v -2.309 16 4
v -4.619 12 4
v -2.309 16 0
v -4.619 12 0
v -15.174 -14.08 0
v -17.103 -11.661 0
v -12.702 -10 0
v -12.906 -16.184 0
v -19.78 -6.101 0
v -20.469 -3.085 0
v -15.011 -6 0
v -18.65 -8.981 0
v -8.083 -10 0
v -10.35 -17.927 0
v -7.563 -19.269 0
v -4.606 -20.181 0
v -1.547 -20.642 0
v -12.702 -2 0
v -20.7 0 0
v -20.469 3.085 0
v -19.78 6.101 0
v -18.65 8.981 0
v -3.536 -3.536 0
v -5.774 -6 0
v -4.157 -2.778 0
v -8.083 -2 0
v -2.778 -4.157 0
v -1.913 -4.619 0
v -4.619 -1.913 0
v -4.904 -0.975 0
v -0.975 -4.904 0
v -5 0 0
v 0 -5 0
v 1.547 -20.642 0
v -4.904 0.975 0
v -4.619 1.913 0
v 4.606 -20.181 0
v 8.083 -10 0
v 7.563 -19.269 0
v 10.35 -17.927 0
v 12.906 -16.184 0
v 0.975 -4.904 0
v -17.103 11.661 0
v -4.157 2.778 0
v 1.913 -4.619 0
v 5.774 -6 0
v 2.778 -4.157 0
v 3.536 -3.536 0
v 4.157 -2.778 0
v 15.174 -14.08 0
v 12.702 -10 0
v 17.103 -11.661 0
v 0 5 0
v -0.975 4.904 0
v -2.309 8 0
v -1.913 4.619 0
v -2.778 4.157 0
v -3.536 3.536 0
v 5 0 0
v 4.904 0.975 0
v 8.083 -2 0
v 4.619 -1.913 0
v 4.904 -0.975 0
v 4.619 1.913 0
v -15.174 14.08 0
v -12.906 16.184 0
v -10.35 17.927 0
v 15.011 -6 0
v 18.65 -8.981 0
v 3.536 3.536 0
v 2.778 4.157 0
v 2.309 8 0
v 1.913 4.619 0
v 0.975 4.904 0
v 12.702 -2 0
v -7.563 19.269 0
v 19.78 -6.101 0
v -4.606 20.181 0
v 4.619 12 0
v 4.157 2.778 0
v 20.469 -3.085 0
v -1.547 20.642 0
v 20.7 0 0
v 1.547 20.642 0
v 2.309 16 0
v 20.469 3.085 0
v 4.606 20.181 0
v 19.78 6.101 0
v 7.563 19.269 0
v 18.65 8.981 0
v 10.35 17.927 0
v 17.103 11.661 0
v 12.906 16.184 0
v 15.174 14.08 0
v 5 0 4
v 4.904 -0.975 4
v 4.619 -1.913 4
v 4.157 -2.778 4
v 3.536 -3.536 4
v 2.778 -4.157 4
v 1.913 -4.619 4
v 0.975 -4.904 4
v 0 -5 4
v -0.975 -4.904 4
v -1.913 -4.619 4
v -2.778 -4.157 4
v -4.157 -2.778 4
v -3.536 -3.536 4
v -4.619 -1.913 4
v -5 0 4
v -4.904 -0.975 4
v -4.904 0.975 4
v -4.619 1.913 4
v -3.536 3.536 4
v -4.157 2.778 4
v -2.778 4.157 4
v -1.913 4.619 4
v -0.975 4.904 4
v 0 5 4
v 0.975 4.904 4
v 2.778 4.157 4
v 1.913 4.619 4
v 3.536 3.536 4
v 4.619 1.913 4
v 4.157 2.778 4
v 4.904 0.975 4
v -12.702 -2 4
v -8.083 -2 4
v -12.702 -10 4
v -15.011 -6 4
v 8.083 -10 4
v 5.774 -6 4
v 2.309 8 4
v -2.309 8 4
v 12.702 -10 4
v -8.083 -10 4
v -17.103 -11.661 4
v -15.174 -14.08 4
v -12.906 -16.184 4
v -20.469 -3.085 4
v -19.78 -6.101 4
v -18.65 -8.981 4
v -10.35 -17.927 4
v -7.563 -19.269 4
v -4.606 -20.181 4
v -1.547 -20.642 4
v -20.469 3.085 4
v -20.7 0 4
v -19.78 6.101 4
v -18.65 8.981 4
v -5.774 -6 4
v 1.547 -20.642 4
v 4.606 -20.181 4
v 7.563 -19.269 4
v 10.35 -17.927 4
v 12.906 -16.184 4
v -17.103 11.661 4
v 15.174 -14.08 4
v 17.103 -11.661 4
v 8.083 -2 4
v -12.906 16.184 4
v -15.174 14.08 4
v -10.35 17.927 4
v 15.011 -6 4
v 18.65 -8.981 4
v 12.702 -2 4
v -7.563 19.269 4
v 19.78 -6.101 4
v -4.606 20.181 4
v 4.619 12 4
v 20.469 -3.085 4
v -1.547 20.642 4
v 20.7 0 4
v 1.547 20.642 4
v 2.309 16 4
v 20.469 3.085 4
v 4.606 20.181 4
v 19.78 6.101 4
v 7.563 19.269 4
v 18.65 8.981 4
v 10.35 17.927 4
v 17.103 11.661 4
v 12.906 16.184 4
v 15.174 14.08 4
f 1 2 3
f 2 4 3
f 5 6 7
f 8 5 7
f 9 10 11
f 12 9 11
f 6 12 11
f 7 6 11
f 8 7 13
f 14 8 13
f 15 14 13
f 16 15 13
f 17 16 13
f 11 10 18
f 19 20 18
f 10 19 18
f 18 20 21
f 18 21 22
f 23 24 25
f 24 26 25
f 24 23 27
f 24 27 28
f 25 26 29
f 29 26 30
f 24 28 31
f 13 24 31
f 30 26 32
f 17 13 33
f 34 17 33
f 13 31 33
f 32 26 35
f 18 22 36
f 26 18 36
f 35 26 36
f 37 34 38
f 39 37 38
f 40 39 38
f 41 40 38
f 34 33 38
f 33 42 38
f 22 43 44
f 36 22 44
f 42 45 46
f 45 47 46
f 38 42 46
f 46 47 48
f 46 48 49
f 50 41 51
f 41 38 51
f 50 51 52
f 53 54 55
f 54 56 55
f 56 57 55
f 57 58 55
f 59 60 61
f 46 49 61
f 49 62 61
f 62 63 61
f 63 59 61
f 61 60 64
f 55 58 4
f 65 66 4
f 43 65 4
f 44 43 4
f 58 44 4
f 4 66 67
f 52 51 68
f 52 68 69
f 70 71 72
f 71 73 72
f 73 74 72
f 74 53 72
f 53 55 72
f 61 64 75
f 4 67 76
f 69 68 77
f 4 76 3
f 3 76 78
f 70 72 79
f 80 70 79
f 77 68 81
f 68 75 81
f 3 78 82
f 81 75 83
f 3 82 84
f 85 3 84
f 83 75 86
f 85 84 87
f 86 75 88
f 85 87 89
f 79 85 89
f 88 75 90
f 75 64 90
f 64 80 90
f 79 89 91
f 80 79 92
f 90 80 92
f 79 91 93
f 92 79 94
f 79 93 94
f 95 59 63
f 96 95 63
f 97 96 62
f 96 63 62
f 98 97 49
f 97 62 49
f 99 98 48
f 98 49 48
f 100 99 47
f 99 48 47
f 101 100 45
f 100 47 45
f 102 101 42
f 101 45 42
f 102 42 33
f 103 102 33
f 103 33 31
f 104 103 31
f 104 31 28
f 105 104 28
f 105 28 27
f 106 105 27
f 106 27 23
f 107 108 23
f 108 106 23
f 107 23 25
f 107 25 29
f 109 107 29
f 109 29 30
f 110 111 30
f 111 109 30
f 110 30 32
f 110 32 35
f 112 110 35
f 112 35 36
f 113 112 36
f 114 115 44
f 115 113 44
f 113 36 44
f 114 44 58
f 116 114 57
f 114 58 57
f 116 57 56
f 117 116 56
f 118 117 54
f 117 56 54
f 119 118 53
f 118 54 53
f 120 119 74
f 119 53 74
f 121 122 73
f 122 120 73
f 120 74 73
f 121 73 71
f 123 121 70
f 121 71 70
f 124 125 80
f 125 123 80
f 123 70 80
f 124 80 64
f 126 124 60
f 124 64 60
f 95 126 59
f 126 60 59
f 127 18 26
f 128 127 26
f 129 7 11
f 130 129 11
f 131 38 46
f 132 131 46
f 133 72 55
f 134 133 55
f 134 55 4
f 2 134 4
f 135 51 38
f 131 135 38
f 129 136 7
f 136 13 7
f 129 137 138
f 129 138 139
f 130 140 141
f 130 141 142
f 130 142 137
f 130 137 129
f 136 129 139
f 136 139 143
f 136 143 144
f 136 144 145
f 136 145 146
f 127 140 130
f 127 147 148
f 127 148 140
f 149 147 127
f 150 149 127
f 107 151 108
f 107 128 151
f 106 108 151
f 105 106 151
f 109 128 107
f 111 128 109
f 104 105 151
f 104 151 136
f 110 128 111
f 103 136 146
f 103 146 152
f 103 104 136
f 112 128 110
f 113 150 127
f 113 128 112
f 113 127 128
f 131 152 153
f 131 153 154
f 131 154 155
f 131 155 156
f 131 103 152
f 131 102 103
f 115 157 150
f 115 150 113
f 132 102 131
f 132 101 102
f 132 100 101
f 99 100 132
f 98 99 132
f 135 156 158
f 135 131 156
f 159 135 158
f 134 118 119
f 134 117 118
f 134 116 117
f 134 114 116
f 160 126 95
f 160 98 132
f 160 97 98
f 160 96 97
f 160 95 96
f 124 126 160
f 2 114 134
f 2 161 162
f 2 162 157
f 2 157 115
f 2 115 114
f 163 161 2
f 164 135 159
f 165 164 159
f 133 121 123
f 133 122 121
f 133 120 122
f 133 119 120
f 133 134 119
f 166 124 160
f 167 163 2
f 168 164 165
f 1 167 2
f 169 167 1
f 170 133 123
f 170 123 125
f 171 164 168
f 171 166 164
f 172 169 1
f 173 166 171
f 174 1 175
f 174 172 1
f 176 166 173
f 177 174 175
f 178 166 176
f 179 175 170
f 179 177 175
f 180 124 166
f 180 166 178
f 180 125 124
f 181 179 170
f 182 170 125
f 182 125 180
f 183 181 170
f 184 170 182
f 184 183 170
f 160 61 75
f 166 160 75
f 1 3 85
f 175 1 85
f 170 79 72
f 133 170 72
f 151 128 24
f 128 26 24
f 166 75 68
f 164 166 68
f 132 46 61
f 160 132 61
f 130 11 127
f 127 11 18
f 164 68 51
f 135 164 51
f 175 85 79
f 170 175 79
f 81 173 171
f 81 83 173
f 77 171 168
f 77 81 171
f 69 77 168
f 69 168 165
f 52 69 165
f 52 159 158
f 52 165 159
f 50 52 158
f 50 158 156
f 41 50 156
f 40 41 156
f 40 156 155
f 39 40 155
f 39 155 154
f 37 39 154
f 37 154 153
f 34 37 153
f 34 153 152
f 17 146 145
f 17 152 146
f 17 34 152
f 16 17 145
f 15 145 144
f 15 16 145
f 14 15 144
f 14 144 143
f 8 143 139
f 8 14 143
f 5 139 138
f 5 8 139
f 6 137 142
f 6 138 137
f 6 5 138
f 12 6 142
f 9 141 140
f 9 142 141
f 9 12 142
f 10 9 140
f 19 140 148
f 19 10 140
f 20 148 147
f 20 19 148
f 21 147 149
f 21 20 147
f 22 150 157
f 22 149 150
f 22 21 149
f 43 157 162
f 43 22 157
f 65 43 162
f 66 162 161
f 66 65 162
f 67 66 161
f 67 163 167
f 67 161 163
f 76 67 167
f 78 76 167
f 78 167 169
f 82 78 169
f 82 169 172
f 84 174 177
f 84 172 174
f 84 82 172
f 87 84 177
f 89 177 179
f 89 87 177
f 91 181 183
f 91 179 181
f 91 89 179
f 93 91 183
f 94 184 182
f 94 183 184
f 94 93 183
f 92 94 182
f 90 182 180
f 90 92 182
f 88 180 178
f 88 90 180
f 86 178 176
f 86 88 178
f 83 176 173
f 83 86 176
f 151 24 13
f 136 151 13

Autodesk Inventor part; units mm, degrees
ref_plane "YZ Plane" through (0, 0, 0) normal (1, 0, 0) x (0, 1, 0)
ref_plane "XZ Plane" through (0, 0, 0) normal (0, 1, 0) x (-1, 0, 0)
ref_plane "XY Plane" through (0, 0, 0) normal (0, 0, 1) x (1, 0, 0)
sketch "Эскиз1" plane through (0, 0, 0) normal (0, 0, 1) x (1, 0, 0)
  circle A0 centre (0, 0) radius 5
  circle A1 centre (0, 0) radius 20.7
  line L0 (0, -28.98) -> (0, 28.98) construction
  line L1 (-28.98, 0) -> (28.98, 0) construction
  line L2 (2.3094, 8) -> (-2.3094, 8)
  line L3 (-2.3094, 8) -> (-4.6188, 12)
  line L4 (-4.6188, 12) -> (-2.3094, 16)
  line L5 (-2.3094, 16) -> (2.3094, 16)
  line L6 (2.3094, 16) -> (4.6188, 12)
  line L7 (4.6188, 12) -> (2.3094, 8)
  line L8 (-8.0829, -10) -> (-12.7017, -10)
  line L9 (-5.7735, -6) -> (-8.0829, -10)
  line L10 (-8.0829, -2) -> (-5.7735, -6)
  line L11 (-12.7017, -2) -> (-8.0829, -2)
  line L12 (-15.0111, -6) -> (-12.7017, -2)
  line L13 (-12.7017, -10) -> (-15.0111, -6)
  line L14 (12.7017, -2) -> (15.0111, -6)
  line L15 (8.0829, -2) -> (12.7017, -2)
  line L16 (5.7735, -6) -> (8.0829, -2)
  line L17 (8.0829, -10) -> (5.7735, -6)
  line L18 (12.7017, -10) -> (8.0829, -10)
  line L19 (15.0111, -6) -> (12.7017, -10)
  point P0 (0, 12)
  dimension "d0" = 10
  dimension "d1" = 41.4
  dimension "d10" = 12
  dimension "d11" = 8
  dimension "d14" = 360
extrude "Выдавливание1" add sketch "Эскиз1" along normal blind 4
properties part number "Бортик внутренний (конусной катушки)"
